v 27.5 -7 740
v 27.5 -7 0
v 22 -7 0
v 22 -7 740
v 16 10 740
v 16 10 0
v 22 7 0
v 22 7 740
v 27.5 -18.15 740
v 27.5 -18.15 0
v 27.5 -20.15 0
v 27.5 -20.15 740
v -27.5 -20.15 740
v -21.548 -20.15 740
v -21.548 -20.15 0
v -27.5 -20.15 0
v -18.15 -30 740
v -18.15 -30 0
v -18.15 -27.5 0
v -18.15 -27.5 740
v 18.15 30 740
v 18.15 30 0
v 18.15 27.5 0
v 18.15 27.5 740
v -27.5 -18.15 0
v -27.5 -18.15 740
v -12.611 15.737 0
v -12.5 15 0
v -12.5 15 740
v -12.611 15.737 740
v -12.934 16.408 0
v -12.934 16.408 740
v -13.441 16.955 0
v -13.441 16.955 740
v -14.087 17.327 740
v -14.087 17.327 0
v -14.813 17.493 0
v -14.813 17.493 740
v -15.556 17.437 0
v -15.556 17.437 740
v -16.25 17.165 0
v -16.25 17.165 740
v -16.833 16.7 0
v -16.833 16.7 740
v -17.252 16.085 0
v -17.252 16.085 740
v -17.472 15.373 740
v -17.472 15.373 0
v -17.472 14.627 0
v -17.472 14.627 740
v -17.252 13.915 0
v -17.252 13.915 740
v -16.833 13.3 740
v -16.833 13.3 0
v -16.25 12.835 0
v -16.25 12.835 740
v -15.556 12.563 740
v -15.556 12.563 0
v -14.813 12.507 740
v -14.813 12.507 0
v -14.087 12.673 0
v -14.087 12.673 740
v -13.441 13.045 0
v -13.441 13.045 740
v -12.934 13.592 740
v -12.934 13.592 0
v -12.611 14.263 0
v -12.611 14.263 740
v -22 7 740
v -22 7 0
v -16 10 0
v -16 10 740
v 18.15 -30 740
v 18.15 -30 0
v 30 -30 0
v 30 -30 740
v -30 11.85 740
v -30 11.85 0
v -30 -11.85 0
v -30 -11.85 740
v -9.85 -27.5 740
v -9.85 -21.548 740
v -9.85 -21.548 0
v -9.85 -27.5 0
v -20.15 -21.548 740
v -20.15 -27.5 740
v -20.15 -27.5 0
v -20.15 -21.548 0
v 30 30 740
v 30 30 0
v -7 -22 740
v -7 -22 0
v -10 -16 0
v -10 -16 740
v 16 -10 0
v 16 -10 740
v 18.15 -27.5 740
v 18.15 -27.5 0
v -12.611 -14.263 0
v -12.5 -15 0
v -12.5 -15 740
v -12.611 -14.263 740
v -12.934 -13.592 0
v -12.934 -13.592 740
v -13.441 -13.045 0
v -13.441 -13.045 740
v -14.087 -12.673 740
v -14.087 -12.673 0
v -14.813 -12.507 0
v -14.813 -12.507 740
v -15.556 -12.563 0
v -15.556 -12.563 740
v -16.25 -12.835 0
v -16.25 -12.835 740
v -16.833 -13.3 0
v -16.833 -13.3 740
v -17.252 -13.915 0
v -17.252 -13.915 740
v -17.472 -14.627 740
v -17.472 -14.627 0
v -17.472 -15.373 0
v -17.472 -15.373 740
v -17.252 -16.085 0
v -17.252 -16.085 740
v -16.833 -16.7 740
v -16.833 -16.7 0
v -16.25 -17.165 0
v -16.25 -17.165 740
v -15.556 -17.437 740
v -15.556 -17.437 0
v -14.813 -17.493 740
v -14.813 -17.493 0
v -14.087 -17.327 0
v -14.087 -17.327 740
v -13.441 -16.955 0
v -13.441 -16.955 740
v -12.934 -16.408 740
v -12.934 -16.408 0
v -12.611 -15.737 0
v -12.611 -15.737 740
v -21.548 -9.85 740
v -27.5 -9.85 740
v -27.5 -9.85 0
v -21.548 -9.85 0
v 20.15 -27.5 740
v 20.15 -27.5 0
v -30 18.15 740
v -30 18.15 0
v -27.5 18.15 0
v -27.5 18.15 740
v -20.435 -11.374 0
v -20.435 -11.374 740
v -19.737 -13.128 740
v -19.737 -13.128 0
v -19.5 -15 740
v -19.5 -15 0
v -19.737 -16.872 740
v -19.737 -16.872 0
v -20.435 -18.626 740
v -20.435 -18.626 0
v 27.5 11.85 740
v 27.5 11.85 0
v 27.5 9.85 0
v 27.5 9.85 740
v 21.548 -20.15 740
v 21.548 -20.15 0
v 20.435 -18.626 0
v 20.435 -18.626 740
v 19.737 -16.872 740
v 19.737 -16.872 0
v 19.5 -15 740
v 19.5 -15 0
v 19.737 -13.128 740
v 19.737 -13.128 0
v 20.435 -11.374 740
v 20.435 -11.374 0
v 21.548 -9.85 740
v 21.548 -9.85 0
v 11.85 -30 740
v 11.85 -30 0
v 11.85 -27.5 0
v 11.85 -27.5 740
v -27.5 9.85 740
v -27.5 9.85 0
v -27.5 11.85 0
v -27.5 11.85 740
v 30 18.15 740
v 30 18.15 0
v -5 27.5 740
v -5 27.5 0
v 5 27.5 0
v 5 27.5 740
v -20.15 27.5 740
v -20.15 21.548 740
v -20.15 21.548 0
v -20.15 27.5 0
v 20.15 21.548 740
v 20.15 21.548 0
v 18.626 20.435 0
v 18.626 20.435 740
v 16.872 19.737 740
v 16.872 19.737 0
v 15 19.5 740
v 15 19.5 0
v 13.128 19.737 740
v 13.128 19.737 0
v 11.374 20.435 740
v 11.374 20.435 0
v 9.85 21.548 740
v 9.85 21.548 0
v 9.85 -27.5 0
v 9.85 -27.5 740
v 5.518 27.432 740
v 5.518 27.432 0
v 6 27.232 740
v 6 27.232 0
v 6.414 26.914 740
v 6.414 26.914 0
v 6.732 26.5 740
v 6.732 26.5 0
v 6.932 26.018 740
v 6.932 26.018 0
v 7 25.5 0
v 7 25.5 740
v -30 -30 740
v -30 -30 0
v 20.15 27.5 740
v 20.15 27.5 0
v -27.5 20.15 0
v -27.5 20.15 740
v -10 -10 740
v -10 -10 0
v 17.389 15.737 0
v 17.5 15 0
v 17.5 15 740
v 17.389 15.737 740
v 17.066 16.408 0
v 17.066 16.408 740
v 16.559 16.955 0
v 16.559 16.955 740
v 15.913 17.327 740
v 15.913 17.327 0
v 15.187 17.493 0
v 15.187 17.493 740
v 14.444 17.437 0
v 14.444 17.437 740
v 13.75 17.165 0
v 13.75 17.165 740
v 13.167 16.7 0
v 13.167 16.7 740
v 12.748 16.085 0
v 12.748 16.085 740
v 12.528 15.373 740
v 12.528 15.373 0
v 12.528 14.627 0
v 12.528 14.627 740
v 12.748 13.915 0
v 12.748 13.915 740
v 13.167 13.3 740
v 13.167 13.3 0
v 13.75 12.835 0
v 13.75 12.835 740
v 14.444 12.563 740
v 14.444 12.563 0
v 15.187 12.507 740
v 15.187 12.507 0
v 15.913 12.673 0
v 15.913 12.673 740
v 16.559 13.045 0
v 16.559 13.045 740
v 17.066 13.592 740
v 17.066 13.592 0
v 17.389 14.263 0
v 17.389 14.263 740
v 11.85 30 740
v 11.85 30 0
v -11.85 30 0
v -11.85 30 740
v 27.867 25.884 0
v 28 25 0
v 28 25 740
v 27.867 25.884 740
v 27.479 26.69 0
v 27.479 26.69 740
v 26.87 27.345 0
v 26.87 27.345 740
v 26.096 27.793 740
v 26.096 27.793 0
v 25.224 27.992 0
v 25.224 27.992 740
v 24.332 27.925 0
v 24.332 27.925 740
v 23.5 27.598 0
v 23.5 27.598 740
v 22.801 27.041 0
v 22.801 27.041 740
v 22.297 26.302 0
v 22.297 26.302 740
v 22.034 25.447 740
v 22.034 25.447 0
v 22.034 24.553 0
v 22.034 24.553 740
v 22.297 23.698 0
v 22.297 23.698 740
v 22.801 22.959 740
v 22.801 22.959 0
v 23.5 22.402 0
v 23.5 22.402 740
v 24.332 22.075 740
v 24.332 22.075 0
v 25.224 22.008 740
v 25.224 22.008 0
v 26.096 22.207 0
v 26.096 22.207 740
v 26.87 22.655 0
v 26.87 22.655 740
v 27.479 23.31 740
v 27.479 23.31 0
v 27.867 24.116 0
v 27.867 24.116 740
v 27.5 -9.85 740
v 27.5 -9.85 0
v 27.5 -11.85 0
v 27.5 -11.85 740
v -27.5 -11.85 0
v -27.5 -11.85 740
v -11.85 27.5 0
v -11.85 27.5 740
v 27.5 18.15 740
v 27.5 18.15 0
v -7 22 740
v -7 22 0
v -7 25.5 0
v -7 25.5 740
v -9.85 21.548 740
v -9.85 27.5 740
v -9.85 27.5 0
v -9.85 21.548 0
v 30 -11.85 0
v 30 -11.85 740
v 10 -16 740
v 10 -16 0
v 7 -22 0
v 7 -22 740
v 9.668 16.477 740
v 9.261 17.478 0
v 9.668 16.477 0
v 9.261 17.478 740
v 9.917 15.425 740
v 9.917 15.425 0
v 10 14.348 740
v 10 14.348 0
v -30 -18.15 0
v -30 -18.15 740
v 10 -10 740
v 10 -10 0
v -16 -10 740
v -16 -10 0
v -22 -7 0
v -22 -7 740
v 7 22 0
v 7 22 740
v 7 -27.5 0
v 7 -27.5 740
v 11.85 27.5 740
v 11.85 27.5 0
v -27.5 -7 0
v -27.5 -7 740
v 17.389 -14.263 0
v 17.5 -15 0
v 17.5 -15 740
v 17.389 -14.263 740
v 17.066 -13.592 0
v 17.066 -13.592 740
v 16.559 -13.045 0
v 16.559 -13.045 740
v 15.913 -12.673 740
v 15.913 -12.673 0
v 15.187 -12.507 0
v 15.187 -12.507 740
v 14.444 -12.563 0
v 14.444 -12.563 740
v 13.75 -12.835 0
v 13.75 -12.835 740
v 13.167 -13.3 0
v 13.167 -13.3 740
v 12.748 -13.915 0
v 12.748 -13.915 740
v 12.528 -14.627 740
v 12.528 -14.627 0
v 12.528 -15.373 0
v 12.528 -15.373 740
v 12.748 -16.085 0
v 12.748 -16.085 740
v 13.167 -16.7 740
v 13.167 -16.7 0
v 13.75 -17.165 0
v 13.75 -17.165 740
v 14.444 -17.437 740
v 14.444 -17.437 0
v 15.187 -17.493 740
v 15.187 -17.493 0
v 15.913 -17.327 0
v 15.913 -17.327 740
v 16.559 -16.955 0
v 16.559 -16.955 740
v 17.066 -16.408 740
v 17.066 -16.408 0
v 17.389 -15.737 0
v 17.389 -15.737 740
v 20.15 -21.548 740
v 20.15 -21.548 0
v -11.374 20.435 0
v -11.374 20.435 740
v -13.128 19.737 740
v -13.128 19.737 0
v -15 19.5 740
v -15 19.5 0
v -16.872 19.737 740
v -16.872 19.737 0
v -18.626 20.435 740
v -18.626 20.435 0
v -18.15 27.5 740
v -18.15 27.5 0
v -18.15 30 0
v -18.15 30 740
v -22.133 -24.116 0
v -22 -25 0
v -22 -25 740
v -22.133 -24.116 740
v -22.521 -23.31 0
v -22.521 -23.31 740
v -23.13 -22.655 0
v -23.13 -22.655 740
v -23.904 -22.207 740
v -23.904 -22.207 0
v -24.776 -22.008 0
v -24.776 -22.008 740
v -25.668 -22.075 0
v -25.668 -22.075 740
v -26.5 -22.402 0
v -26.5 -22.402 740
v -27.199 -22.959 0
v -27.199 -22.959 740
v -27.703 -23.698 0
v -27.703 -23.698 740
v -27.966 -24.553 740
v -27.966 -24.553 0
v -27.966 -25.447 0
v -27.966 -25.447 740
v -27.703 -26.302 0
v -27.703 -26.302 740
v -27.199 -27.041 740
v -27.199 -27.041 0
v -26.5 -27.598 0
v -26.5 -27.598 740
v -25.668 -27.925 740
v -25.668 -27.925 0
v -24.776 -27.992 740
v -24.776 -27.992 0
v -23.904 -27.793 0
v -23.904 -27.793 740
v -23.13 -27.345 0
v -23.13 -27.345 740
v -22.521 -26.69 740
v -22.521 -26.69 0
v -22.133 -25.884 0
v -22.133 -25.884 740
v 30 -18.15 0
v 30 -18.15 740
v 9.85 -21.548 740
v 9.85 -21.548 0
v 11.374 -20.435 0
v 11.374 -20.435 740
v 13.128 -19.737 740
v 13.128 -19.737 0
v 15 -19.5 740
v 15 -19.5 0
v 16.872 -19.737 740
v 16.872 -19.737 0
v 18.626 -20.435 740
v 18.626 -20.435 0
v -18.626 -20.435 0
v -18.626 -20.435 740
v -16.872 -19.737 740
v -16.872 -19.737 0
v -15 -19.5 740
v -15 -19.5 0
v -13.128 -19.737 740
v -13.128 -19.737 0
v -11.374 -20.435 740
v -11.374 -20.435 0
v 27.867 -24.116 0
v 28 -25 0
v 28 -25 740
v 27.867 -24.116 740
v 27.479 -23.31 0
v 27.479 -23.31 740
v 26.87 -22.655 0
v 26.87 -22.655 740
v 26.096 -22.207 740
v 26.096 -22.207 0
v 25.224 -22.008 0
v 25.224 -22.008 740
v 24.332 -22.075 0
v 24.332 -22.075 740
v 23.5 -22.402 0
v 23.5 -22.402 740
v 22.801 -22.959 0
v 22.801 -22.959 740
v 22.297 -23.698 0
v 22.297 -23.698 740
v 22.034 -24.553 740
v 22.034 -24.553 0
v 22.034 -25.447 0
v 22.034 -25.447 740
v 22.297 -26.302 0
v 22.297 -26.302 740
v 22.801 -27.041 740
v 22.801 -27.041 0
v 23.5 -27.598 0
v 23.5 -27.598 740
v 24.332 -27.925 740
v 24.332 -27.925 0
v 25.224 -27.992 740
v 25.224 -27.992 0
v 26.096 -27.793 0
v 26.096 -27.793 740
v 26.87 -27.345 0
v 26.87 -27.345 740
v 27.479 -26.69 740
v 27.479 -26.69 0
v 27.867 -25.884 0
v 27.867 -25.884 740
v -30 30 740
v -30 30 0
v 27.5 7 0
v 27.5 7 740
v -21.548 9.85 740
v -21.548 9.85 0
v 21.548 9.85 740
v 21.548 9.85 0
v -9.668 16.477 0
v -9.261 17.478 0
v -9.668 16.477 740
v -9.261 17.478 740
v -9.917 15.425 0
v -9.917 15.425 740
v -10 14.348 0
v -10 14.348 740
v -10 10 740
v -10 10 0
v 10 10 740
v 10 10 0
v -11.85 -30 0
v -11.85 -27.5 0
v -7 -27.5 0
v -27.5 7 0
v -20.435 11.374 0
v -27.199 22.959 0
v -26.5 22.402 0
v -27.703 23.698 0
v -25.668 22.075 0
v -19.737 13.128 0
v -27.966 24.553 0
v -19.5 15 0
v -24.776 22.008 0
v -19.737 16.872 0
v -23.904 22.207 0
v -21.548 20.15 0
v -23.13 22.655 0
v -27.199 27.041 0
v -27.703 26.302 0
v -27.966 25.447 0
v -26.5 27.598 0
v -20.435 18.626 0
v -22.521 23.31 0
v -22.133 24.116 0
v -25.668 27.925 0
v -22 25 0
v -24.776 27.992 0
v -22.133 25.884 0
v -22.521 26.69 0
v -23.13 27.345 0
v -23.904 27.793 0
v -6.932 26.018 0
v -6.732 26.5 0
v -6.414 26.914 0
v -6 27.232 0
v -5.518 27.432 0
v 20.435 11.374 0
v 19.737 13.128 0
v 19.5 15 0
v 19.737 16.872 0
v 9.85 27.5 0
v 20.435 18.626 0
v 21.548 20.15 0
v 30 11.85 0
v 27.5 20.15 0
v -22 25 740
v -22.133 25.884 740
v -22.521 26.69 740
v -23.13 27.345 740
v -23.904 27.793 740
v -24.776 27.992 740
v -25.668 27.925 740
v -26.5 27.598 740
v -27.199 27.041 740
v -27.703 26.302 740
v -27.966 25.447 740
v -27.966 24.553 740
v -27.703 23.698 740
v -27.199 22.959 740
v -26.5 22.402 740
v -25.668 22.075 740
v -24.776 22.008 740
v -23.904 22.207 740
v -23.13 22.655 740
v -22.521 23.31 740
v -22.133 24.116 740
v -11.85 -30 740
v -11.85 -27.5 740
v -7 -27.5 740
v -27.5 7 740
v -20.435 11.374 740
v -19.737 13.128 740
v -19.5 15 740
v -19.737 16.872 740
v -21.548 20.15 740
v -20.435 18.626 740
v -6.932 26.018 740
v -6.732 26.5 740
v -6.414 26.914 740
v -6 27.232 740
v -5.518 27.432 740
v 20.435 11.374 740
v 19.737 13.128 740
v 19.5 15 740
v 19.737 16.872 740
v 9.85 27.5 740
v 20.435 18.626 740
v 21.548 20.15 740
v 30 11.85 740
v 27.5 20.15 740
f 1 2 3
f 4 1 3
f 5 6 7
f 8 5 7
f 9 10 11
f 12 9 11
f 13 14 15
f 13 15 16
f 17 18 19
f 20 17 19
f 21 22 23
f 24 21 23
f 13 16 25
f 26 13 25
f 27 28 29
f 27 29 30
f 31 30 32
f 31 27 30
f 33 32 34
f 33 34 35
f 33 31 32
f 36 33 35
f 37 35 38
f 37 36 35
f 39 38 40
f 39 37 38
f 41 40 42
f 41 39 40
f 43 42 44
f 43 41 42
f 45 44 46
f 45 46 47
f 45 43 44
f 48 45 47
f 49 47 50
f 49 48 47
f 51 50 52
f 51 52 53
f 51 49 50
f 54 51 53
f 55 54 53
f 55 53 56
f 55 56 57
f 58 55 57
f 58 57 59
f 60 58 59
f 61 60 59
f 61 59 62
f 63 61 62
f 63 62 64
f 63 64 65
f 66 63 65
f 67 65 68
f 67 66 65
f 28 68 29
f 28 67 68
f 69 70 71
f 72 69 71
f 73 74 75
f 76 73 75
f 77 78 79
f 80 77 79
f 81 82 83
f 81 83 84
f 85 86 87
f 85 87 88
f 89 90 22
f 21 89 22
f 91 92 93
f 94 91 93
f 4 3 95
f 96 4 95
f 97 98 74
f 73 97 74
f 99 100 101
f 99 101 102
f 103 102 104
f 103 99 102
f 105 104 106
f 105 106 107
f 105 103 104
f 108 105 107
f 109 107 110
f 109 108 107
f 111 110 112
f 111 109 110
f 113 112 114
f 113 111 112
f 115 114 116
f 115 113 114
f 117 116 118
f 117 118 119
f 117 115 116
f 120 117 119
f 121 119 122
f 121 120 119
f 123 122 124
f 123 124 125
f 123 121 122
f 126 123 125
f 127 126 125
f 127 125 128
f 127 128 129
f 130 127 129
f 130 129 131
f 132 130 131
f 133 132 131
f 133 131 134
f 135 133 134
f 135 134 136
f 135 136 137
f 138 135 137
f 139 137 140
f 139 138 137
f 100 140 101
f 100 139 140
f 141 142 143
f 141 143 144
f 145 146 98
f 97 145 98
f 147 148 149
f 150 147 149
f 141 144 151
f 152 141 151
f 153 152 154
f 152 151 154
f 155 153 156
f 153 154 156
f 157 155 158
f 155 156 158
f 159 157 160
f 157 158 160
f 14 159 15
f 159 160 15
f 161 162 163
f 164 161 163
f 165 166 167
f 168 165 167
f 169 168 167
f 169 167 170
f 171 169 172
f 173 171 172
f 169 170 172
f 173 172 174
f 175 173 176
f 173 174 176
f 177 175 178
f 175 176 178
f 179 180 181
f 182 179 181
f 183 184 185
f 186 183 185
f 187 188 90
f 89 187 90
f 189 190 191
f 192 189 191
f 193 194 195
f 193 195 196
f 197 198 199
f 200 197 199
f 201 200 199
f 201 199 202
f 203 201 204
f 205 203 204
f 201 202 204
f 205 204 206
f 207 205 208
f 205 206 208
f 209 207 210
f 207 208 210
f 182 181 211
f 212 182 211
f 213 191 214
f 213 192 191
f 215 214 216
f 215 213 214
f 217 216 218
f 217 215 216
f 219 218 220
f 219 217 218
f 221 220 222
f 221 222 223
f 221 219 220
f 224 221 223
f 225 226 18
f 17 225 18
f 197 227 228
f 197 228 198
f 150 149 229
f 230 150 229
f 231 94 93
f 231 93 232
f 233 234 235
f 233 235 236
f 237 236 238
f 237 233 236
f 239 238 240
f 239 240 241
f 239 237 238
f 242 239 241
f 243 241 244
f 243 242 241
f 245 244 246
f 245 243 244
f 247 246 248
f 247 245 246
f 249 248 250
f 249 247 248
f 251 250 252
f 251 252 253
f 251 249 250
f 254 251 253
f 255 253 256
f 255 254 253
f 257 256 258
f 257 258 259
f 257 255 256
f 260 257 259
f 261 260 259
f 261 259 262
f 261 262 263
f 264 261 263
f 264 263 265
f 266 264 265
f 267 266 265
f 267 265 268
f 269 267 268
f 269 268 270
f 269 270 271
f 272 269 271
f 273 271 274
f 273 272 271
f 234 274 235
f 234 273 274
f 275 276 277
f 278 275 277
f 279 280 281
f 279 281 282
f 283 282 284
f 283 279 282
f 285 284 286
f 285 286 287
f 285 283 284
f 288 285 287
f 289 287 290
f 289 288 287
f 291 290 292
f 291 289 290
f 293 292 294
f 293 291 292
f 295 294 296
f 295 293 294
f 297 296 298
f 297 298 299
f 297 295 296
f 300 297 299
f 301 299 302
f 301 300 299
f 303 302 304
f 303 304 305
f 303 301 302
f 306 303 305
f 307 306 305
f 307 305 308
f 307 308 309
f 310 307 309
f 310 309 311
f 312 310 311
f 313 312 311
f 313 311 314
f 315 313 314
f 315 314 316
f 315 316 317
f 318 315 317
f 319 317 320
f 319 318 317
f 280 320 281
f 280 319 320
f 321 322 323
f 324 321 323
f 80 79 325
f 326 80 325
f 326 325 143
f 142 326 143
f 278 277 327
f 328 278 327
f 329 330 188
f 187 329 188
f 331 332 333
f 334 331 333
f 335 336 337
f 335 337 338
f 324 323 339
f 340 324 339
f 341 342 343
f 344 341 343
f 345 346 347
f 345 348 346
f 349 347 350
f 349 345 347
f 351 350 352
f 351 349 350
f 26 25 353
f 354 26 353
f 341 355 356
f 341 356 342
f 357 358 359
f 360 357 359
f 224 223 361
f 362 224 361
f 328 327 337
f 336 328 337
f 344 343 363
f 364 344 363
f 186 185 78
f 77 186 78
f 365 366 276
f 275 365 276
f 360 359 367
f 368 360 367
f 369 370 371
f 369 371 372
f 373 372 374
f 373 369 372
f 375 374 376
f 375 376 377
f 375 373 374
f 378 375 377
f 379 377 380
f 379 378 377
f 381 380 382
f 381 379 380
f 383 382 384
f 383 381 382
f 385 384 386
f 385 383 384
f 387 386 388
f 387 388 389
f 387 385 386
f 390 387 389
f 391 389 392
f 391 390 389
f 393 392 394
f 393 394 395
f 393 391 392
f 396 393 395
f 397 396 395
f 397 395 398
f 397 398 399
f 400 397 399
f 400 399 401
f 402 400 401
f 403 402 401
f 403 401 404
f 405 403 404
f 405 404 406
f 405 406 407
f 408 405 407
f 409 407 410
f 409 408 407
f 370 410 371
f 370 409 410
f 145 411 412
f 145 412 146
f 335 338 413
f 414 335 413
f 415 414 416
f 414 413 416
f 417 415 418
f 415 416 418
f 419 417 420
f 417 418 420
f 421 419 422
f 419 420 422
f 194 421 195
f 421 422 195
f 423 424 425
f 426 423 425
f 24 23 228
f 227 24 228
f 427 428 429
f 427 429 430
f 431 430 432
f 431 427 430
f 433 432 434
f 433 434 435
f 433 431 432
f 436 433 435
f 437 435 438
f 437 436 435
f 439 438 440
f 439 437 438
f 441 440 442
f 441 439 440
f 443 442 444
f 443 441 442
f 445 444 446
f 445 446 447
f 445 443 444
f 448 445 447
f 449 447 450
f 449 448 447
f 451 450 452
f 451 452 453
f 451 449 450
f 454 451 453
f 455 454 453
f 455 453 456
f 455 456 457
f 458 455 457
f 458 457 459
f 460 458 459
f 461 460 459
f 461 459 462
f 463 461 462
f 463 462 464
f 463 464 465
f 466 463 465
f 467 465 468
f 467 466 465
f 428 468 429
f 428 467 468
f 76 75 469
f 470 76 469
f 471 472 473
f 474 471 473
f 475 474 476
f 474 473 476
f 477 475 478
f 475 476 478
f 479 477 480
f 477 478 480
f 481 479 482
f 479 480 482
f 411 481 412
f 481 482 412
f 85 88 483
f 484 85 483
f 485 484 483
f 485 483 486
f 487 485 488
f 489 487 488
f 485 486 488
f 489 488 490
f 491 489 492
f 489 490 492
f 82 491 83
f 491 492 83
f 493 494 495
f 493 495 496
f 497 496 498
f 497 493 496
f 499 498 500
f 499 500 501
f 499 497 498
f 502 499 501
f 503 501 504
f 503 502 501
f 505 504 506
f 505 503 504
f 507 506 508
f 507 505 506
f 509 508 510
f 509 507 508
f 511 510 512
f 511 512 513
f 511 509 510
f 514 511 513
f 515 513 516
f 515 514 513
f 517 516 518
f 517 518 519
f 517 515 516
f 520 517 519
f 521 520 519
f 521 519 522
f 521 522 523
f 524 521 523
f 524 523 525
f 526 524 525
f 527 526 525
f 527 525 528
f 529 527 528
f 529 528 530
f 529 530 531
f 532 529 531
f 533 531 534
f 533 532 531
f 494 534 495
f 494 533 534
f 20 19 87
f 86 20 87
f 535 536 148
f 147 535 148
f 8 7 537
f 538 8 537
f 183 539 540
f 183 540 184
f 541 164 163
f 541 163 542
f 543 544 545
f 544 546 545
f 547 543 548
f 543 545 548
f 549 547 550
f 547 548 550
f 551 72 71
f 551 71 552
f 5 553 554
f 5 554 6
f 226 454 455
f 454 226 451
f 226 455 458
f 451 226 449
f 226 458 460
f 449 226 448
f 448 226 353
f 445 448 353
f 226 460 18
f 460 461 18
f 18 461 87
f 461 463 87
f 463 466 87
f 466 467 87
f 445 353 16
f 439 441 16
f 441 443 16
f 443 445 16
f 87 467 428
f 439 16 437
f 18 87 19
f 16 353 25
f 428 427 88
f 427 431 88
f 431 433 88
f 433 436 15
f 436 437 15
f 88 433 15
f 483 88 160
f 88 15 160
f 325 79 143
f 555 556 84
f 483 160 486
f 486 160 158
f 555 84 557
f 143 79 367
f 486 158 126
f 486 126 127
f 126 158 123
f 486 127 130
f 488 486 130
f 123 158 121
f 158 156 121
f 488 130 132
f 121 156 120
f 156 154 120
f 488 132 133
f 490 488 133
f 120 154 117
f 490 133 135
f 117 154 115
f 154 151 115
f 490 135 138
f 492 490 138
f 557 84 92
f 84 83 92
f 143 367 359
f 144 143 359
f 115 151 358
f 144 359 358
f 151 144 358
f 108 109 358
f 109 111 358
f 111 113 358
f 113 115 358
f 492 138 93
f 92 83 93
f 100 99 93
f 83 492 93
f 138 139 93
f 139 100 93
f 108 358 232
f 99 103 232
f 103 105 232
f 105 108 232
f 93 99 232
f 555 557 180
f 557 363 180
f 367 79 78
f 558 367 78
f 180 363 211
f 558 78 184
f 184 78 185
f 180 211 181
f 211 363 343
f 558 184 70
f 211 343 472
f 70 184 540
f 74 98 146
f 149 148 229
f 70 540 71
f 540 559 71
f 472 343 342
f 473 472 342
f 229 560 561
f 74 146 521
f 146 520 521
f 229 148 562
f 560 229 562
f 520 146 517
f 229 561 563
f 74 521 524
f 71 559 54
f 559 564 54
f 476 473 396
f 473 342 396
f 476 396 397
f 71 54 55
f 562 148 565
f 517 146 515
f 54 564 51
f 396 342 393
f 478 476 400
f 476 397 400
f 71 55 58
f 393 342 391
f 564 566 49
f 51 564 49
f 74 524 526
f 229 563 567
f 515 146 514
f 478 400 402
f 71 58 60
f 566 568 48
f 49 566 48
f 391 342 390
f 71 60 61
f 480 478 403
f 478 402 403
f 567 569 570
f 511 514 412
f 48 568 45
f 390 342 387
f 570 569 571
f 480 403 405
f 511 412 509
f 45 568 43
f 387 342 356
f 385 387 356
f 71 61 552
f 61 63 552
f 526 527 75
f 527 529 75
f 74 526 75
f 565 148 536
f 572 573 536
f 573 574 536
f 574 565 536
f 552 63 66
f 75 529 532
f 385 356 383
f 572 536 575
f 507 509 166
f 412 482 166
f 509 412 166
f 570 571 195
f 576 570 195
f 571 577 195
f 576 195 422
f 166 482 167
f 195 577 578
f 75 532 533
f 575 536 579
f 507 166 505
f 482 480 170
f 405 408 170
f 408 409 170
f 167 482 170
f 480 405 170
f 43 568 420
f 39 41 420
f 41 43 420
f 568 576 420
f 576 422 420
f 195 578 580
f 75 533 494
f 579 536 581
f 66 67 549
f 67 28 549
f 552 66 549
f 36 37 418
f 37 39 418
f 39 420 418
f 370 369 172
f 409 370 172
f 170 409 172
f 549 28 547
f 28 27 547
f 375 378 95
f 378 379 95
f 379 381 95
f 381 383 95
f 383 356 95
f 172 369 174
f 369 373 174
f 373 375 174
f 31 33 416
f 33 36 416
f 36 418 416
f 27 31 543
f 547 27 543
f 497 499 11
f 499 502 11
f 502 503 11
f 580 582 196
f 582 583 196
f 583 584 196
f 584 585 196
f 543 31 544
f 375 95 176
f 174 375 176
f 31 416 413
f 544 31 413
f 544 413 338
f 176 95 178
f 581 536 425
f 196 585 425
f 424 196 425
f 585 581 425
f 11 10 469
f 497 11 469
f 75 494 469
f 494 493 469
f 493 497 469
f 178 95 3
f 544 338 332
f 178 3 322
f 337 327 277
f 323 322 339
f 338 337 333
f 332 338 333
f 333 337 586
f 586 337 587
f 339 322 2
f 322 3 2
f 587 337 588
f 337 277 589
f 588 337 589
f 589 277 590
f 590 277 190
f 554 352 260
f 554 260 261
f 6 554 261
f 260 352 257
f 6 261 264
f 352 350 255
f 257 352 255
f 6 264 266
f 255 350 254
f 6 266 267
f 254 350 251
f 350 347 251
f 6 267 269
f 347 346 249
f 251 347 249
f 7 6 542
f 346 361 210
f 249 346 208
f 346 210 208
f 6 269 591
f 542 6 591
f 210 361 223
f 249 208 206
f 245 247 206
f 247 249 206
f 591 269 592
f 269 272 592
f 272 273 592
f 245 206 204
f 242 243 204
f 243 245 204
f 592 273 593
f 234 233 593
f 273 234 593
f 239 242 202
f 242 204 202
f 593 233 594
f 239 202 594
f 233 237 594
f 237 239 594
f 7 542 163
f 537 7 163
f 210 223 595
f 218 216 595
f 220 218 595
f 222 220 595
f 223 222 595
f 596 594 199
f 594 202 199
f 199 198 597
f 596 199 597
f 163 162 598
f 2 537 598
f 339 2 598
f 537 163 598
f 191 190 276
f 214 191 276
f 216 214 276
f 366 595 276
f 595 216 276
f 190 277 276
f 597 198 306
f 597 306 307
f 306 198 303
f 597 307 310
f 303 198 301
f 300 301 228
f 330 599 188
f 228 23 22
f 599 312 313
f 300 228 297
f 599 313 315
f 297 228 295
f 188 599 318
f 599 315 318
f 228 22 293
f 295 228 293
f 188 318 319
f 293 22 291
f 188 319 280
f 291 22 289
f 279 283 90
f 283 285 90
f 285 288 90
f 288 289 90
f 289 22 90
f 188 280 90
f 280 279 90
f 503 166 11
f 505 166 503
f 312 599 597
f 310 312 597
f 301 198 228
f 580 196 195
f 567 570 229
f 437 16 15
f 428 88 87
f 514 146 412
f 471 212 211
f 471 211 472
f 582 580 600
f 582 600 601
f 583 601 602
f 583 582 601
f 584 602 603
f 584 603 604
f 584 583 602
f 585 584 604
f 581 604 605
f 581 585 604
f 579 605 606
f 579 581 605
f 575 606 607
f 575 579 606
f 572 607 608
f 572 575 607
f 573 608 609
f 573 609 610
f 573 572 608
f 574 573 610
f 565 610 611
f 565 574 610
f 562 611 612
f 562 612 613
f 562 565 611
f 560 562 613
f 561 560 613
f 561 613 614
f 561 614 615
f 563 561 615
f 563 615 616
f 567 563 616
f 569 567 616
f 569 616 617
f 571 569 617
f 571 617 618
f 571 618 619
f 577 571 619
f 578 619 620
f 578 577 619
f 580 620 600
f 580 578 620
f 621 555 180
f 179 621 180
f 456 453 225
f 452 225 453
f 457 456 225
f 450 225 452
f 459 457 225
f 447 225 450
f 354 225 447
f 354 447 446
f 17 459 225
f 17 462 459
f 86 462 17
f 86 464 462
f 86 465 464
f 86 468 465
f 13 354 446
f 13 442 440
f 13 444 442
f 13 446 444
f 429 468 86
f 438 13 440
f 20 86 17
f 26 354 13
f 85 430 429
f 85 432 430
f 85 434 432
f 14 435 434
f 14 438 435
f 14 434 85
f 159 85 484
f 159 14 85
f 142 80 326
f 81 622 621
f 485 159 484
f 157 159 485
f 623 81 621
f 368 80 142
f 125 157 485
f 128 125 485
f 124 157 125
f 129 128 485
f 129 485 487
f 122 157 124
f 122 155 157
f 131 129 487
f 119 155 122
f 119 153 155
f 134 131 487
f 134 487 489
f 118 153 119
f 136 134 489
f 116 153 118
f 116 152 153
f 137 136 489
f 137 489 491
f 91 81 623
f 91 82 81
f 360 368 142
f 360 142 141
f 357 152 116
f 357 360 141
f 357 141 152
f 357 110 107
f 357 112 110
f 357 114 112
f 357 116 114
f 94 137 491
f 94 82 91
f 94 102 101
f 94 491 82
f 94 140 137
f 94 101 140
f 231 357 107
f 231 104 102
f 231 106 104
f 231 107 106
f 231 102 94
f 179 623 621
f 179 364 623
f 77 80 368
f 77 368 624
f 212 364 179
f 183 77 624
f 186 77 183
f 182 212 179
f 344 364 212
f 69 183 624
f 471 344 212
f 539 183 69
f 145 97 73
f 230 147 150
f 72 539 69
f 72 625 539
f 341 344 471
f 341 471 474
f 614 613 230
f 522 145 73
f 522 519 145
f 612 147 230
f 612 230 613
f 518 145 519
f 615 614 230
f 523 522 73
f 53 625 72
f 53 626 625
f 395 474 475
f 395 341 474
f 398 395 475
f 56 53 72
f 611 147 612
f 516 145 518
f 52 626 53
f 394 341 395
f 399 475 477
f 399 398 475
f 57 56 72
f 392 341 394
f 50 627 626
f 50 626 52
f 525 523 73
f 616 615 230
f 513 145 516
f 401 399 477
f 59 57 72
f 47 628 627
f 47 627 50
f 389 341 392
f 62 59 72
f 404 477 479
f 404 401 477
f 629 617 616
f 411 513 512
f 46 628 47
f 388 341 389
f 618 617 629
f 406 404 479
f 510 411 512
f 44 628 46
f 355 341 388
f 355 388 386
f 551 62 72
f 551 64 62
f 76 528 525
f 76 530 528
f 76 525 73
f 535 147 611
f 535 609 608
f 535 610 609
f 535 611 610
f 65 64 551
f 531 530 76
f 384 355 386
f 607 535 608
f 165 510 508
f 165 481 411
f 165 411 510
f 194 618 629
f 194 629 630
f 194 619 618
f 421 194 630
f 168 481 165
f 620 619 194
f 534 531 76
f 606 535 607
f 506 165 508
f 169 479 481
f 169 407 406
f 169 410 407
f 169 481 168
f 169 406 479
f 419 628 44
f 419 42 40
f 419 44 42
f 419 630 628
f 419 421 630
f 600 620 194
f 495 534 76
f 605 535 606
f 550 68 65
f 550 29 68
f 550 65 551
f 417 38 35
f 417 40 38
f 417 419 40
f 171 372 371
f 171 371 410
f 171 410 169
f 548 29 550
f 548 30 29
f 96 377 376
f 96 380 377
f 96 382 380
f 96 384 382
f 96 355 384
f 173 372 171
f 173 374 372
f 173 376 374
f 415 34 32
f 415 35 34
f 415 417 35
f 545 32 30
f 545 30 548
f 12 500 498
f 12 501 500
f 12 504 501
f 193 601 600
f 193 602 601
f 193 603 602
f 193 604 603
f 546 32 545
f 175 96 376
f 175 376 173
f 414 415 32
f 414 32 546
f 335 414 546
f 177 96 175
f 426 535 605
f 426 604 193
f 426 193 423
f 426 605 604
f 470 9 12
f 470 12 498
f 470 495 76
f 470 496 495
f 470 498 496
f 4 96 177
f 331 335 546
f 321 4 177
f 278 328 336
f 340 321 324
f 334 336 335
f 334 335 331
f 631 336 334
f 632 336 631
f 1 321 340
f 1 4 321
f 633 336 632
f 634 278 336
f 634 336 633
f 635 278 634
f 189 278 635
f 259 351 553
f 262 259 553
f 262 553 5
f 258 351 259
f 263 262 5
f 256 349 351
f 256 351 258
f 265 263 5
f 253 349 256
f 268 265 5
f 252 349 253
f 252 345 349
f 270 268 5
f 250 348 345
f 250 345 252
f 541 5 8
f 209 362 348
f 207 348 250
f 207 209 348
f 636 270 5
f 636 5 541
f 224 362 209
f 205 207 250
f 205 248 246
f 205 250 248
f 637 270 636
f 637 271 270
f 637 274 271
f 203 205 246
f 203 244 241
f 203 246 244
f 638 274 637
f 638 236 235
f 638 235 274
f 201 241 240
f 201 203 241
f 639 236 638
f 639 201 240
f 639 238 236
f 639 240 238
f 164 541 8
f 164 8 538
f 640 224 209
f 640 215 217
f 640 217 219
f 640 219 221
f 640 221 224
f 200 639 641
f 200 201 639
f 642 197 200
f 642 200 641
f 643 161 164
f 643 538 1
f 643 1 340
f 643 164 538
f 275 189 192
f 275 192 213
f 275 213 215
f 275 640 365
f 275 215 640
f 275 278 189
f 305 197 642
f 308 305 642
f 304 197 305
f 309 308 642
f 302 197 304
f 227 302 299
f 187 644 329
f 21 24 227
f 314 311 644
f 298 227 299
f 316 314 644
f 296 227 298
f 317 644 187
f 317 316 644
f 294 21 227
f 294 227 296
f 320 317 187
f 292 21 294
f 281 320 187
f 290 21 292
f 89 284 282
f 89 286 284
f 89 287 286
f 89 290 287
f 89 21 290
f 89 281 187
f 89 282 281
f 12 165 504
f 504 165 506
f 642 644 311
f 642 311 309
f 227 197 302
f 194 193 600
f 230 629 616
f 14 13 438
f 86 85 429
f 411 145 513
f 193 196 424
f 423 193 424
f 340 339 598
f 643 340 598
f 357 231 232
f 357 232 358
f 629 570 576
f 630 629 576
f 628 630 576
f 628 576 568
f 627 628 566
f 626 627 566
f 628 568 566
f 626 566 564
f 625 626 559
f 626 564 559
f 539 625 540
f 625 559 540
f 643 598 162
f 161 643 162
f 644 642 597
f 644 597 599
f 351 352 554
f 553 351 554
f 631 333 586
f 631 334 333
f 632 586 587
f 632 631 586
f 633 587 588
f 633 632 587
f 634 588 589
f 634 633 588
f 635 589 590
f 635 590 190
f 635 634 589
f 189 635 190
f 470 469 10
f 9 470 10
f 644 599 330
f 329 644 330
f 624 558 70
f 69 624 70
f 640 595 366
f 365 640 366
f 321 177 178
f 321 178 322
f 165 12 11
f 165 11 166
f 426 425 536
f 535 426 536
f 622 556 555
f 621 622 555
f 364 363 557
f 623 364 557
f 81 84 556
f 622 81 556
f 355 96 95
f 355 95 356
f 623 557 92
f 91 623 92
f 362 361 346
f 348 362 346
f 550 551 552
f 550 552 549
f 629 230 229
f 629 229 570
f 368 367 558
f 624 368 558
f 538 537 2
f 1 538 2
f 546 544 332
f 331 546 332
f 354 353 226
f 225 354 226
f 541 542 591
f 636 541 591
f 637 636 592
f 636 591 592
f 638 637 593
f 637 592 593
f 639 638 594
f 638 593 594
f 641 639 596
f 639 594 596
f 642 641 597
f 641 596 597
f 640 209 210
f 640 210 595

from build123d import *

# Parameters (mm, degrees)
F0_R     = 3
F0_R_2   = 2.5
F1_DEPTH = 740
F2_R     = 2
F3_R     = 7


# Not quite as in the source:
# - a feature names something its author has since deleted; it is built from what else it names


with BuildPart() as f1:
    # F0 (on Top) → F1 (new body)
    with BuildSketch(Plane.XY):
        with BuildLine():
            Line((18.15, -30), (30, -30))
            Line((30, -30), (30, -18.15))
            Line((30, -18.15), (27.5, -18.15))
            Line((27.5, -18.15), (27.5, -20.15))
            Line((27.5, -20.15), (21.5477069044, -20.15))
            ThreePointArc((21.5477069044, -20.15), (19.5, -15), (21.5477069044, -9.85))
            Line((21.5477069044, -9.85), (27.5, -9.85))
            Line((27.5, -9.85), (27.5, -11.85))
            Line((27.5, -11.85), (30, -11.85))
            Line((30, -11.85), (30, 11.85))
            Line((30, 11.85), (27.5, 11.85))
            Line((27.5, 11.85), (27.5, 9.85))
            Line((27.5, 9.85), (21.5477069044, 9.85))
            ThreePointArc((21.5477069044, 9.85), (19.5, 15), (21.5477069044, 20.15))
            Line((21.5477069044, 20.15), (27.5, 20.15))
            Line((27.5, 20.15), (27.5, 18.15))
            Line((27.5, 18.15), (30, 18.15))
            Line((30, 18.15), (30, 30))
            Line((30, 30), (18.15, 30))
            Line((18.15, 30), (18.15, 27.5))
            Line((18.15, 27.5), (20.15, 27.5))
            Line((20.15, 27.5), (20.15, 21.5477069044))
            ThreePointArc((20.15, 21.5477069044), (15, 19.5), (9.85, 21.5477069044))
            Line((9.85, 21.5477069044), (9.85, 27.5))
            Line((9.85, 27.5), (11.85, 27.5))
            Line((11.85, 27.5), (11.85, 30))
            Line((11.85, 30), (-11.85, 30))
            Line((-11.85, 30), (-11.85, 27.5))
            Line((-11.85, 27.5), (-9.85, 27.5))
            Line((-9.85, 27.5), (-9.85, 21.5477069044))
            ThreePointArc((-9.85, 21.5477069044), (-15, 19.5), (-20.15, 21.5477069044))
            Line((-20.15, 21.5477069044), (-20.15, 27.5))
            Line((-20.15, 27.5), (-18.15, 27.5))
            Line((-18.15, 27.5), (-18.15, 30))
            Line((-18.15, 30), (-30, 30))
            Line((-30, 30), (-30, 18.15))
            Line((-30, 18.15), (-27.5, 18.15))
            Line((-27.5, 18.15), (-27.5, 20.15))
            Line((-27.5, 20.15), (-21.5477069044, 20.15))
            ThreePointArc((-21.5477069044, 20.15), (-19.5, 15), (-21.5477069044, 9.85))
            Line((-21.5477069044, 9.85), (-27.5, 9.85))
            Line((-27.5, 9.85), (-27.5, 11.85))
            Line((-27.5, 11.85), (-30, 11.85))
            Line((-30, 11.85), (-30, -11.85))
            Line((-30, -11.85), (-27.5, -11.85))
            Line((-27.5, -11.85), (-27.5, -9.85))
            Line((-27.5, -9.85), (-21.5477069044, -9.85))
            ThreePointArc((-21.5477069044, -9.85), (-19.5, -15), (-21.5477069044, -20.15))
            Line((-21.5477069044, -20.15), (-27.5, -20.15))
            Line((-27.5, -20.15), (-27.5, -18.15))
            Line((-27.5, -18.15), (-30, -18.15))
            Line((-30, -18.15), (-30, -30))
            Line((-30, -30), (-18.15, -30))
            Line((-18.15, -30), (-18.15, -27.5))
            Line((-18.15, -27.5), (-20.15, -27.5))
            Line((-20.15, -27.5), (-20.15, -21.5477069044))
            ThreePointArc((-20.15, -21.5477069044), (-15, -19.5), (-9.85, -21.5477069044))
            Line((-9.85, -21.5477069044), (-9.85, -27.5))
            Line((-9.85, -27.5), (-11.85, -27.5))
            Line((-11.85, -27.5), (-11.85, -30))
            Line((-11.85, -30), (11.85, -30))
            Line((11.85, -30), (11.85, -27.5))
            Line((11.85, -27.5), (9.85, -27.5))
            Line((9.85, -27.5), (9.85, -21.5477069044))
            ThreePointArc((9.85, -21.5477069044), (15, -19.5), (20.15, -21.5477069044))
            Line((20.15, -21.5477069044), (20.15, -27.5))
            Line((20.15, -27.5), (18.15, -27.5))
            Line((18.15, -27.5), (18.15, -30))
        make_face()
        with Locations((-25, -25)):
            Circle(F0_R, mode=Mode.SUBTRACT)
        with Locations((-15, -15)):
            Circle(F0_R_2, mode=Mode.SUBTRACT)
        with Locations((25, -25)):
            Circle(F0_R, mode=Mode.SUBTRACT)
        with Locations((15, -15)):
            Circle(F0_R_2, mode=Mode.SUBTRACT)
        with Locations((-25, 25)):
            Circle(F0_R, mode=Mode.SUBTRACT)
        with Locations((-15, 15)):
            Circle(F0_R_2, mode=Mode.SUBTRACT)
        Polygon((-7, 22), (-7, 27.5), (0, 27.5), (7, 27.5), (7, 22), (10, 16), (10, 10), (16, 10), (22, 7), (27.5, 7), (27.5, 0), (27.5, -7), (22, -7), (16, -10), (10, -10), (10, -16), (7, -22), (7, -27.5), (0, -27.5), (-7, -27.5), (-7, -22), (-10, -16), (-10, -10), (-16, -10), (-22, -7), (-27.5, -7), (-27.5, 0), (-27.5, 7), (-22, 7), (-16, 10), (-10, 10), (-10, 16), align=None, mode=Mode.SUBTRACT)
        with Locations((15, 15)):
            Circle(F0_R_2, mode=Mode.SUBTRACT)
        with Locations((25, 25)):
            Circle(F0_R, mode=Mode.SUBTRACT)
    extrude(amount=F1_DEPTH)

    # F2
    f2_edges = [f1.edges().sort_by_distance(p)[0] for p in [
        (-7, 27.5, 370),
        (7, 27.5, 370),
    ]]
    fillet(f2_edges, radius=F2_R)

    # F3
    f3_edges = [f1.edges().sort_by_distance(p)[0] for p in [
        (-10, 16, 370),
        (10, 16, 370),
    ]]
    fillet(f3_edges, radius=F3_R)


solid = f1.part
